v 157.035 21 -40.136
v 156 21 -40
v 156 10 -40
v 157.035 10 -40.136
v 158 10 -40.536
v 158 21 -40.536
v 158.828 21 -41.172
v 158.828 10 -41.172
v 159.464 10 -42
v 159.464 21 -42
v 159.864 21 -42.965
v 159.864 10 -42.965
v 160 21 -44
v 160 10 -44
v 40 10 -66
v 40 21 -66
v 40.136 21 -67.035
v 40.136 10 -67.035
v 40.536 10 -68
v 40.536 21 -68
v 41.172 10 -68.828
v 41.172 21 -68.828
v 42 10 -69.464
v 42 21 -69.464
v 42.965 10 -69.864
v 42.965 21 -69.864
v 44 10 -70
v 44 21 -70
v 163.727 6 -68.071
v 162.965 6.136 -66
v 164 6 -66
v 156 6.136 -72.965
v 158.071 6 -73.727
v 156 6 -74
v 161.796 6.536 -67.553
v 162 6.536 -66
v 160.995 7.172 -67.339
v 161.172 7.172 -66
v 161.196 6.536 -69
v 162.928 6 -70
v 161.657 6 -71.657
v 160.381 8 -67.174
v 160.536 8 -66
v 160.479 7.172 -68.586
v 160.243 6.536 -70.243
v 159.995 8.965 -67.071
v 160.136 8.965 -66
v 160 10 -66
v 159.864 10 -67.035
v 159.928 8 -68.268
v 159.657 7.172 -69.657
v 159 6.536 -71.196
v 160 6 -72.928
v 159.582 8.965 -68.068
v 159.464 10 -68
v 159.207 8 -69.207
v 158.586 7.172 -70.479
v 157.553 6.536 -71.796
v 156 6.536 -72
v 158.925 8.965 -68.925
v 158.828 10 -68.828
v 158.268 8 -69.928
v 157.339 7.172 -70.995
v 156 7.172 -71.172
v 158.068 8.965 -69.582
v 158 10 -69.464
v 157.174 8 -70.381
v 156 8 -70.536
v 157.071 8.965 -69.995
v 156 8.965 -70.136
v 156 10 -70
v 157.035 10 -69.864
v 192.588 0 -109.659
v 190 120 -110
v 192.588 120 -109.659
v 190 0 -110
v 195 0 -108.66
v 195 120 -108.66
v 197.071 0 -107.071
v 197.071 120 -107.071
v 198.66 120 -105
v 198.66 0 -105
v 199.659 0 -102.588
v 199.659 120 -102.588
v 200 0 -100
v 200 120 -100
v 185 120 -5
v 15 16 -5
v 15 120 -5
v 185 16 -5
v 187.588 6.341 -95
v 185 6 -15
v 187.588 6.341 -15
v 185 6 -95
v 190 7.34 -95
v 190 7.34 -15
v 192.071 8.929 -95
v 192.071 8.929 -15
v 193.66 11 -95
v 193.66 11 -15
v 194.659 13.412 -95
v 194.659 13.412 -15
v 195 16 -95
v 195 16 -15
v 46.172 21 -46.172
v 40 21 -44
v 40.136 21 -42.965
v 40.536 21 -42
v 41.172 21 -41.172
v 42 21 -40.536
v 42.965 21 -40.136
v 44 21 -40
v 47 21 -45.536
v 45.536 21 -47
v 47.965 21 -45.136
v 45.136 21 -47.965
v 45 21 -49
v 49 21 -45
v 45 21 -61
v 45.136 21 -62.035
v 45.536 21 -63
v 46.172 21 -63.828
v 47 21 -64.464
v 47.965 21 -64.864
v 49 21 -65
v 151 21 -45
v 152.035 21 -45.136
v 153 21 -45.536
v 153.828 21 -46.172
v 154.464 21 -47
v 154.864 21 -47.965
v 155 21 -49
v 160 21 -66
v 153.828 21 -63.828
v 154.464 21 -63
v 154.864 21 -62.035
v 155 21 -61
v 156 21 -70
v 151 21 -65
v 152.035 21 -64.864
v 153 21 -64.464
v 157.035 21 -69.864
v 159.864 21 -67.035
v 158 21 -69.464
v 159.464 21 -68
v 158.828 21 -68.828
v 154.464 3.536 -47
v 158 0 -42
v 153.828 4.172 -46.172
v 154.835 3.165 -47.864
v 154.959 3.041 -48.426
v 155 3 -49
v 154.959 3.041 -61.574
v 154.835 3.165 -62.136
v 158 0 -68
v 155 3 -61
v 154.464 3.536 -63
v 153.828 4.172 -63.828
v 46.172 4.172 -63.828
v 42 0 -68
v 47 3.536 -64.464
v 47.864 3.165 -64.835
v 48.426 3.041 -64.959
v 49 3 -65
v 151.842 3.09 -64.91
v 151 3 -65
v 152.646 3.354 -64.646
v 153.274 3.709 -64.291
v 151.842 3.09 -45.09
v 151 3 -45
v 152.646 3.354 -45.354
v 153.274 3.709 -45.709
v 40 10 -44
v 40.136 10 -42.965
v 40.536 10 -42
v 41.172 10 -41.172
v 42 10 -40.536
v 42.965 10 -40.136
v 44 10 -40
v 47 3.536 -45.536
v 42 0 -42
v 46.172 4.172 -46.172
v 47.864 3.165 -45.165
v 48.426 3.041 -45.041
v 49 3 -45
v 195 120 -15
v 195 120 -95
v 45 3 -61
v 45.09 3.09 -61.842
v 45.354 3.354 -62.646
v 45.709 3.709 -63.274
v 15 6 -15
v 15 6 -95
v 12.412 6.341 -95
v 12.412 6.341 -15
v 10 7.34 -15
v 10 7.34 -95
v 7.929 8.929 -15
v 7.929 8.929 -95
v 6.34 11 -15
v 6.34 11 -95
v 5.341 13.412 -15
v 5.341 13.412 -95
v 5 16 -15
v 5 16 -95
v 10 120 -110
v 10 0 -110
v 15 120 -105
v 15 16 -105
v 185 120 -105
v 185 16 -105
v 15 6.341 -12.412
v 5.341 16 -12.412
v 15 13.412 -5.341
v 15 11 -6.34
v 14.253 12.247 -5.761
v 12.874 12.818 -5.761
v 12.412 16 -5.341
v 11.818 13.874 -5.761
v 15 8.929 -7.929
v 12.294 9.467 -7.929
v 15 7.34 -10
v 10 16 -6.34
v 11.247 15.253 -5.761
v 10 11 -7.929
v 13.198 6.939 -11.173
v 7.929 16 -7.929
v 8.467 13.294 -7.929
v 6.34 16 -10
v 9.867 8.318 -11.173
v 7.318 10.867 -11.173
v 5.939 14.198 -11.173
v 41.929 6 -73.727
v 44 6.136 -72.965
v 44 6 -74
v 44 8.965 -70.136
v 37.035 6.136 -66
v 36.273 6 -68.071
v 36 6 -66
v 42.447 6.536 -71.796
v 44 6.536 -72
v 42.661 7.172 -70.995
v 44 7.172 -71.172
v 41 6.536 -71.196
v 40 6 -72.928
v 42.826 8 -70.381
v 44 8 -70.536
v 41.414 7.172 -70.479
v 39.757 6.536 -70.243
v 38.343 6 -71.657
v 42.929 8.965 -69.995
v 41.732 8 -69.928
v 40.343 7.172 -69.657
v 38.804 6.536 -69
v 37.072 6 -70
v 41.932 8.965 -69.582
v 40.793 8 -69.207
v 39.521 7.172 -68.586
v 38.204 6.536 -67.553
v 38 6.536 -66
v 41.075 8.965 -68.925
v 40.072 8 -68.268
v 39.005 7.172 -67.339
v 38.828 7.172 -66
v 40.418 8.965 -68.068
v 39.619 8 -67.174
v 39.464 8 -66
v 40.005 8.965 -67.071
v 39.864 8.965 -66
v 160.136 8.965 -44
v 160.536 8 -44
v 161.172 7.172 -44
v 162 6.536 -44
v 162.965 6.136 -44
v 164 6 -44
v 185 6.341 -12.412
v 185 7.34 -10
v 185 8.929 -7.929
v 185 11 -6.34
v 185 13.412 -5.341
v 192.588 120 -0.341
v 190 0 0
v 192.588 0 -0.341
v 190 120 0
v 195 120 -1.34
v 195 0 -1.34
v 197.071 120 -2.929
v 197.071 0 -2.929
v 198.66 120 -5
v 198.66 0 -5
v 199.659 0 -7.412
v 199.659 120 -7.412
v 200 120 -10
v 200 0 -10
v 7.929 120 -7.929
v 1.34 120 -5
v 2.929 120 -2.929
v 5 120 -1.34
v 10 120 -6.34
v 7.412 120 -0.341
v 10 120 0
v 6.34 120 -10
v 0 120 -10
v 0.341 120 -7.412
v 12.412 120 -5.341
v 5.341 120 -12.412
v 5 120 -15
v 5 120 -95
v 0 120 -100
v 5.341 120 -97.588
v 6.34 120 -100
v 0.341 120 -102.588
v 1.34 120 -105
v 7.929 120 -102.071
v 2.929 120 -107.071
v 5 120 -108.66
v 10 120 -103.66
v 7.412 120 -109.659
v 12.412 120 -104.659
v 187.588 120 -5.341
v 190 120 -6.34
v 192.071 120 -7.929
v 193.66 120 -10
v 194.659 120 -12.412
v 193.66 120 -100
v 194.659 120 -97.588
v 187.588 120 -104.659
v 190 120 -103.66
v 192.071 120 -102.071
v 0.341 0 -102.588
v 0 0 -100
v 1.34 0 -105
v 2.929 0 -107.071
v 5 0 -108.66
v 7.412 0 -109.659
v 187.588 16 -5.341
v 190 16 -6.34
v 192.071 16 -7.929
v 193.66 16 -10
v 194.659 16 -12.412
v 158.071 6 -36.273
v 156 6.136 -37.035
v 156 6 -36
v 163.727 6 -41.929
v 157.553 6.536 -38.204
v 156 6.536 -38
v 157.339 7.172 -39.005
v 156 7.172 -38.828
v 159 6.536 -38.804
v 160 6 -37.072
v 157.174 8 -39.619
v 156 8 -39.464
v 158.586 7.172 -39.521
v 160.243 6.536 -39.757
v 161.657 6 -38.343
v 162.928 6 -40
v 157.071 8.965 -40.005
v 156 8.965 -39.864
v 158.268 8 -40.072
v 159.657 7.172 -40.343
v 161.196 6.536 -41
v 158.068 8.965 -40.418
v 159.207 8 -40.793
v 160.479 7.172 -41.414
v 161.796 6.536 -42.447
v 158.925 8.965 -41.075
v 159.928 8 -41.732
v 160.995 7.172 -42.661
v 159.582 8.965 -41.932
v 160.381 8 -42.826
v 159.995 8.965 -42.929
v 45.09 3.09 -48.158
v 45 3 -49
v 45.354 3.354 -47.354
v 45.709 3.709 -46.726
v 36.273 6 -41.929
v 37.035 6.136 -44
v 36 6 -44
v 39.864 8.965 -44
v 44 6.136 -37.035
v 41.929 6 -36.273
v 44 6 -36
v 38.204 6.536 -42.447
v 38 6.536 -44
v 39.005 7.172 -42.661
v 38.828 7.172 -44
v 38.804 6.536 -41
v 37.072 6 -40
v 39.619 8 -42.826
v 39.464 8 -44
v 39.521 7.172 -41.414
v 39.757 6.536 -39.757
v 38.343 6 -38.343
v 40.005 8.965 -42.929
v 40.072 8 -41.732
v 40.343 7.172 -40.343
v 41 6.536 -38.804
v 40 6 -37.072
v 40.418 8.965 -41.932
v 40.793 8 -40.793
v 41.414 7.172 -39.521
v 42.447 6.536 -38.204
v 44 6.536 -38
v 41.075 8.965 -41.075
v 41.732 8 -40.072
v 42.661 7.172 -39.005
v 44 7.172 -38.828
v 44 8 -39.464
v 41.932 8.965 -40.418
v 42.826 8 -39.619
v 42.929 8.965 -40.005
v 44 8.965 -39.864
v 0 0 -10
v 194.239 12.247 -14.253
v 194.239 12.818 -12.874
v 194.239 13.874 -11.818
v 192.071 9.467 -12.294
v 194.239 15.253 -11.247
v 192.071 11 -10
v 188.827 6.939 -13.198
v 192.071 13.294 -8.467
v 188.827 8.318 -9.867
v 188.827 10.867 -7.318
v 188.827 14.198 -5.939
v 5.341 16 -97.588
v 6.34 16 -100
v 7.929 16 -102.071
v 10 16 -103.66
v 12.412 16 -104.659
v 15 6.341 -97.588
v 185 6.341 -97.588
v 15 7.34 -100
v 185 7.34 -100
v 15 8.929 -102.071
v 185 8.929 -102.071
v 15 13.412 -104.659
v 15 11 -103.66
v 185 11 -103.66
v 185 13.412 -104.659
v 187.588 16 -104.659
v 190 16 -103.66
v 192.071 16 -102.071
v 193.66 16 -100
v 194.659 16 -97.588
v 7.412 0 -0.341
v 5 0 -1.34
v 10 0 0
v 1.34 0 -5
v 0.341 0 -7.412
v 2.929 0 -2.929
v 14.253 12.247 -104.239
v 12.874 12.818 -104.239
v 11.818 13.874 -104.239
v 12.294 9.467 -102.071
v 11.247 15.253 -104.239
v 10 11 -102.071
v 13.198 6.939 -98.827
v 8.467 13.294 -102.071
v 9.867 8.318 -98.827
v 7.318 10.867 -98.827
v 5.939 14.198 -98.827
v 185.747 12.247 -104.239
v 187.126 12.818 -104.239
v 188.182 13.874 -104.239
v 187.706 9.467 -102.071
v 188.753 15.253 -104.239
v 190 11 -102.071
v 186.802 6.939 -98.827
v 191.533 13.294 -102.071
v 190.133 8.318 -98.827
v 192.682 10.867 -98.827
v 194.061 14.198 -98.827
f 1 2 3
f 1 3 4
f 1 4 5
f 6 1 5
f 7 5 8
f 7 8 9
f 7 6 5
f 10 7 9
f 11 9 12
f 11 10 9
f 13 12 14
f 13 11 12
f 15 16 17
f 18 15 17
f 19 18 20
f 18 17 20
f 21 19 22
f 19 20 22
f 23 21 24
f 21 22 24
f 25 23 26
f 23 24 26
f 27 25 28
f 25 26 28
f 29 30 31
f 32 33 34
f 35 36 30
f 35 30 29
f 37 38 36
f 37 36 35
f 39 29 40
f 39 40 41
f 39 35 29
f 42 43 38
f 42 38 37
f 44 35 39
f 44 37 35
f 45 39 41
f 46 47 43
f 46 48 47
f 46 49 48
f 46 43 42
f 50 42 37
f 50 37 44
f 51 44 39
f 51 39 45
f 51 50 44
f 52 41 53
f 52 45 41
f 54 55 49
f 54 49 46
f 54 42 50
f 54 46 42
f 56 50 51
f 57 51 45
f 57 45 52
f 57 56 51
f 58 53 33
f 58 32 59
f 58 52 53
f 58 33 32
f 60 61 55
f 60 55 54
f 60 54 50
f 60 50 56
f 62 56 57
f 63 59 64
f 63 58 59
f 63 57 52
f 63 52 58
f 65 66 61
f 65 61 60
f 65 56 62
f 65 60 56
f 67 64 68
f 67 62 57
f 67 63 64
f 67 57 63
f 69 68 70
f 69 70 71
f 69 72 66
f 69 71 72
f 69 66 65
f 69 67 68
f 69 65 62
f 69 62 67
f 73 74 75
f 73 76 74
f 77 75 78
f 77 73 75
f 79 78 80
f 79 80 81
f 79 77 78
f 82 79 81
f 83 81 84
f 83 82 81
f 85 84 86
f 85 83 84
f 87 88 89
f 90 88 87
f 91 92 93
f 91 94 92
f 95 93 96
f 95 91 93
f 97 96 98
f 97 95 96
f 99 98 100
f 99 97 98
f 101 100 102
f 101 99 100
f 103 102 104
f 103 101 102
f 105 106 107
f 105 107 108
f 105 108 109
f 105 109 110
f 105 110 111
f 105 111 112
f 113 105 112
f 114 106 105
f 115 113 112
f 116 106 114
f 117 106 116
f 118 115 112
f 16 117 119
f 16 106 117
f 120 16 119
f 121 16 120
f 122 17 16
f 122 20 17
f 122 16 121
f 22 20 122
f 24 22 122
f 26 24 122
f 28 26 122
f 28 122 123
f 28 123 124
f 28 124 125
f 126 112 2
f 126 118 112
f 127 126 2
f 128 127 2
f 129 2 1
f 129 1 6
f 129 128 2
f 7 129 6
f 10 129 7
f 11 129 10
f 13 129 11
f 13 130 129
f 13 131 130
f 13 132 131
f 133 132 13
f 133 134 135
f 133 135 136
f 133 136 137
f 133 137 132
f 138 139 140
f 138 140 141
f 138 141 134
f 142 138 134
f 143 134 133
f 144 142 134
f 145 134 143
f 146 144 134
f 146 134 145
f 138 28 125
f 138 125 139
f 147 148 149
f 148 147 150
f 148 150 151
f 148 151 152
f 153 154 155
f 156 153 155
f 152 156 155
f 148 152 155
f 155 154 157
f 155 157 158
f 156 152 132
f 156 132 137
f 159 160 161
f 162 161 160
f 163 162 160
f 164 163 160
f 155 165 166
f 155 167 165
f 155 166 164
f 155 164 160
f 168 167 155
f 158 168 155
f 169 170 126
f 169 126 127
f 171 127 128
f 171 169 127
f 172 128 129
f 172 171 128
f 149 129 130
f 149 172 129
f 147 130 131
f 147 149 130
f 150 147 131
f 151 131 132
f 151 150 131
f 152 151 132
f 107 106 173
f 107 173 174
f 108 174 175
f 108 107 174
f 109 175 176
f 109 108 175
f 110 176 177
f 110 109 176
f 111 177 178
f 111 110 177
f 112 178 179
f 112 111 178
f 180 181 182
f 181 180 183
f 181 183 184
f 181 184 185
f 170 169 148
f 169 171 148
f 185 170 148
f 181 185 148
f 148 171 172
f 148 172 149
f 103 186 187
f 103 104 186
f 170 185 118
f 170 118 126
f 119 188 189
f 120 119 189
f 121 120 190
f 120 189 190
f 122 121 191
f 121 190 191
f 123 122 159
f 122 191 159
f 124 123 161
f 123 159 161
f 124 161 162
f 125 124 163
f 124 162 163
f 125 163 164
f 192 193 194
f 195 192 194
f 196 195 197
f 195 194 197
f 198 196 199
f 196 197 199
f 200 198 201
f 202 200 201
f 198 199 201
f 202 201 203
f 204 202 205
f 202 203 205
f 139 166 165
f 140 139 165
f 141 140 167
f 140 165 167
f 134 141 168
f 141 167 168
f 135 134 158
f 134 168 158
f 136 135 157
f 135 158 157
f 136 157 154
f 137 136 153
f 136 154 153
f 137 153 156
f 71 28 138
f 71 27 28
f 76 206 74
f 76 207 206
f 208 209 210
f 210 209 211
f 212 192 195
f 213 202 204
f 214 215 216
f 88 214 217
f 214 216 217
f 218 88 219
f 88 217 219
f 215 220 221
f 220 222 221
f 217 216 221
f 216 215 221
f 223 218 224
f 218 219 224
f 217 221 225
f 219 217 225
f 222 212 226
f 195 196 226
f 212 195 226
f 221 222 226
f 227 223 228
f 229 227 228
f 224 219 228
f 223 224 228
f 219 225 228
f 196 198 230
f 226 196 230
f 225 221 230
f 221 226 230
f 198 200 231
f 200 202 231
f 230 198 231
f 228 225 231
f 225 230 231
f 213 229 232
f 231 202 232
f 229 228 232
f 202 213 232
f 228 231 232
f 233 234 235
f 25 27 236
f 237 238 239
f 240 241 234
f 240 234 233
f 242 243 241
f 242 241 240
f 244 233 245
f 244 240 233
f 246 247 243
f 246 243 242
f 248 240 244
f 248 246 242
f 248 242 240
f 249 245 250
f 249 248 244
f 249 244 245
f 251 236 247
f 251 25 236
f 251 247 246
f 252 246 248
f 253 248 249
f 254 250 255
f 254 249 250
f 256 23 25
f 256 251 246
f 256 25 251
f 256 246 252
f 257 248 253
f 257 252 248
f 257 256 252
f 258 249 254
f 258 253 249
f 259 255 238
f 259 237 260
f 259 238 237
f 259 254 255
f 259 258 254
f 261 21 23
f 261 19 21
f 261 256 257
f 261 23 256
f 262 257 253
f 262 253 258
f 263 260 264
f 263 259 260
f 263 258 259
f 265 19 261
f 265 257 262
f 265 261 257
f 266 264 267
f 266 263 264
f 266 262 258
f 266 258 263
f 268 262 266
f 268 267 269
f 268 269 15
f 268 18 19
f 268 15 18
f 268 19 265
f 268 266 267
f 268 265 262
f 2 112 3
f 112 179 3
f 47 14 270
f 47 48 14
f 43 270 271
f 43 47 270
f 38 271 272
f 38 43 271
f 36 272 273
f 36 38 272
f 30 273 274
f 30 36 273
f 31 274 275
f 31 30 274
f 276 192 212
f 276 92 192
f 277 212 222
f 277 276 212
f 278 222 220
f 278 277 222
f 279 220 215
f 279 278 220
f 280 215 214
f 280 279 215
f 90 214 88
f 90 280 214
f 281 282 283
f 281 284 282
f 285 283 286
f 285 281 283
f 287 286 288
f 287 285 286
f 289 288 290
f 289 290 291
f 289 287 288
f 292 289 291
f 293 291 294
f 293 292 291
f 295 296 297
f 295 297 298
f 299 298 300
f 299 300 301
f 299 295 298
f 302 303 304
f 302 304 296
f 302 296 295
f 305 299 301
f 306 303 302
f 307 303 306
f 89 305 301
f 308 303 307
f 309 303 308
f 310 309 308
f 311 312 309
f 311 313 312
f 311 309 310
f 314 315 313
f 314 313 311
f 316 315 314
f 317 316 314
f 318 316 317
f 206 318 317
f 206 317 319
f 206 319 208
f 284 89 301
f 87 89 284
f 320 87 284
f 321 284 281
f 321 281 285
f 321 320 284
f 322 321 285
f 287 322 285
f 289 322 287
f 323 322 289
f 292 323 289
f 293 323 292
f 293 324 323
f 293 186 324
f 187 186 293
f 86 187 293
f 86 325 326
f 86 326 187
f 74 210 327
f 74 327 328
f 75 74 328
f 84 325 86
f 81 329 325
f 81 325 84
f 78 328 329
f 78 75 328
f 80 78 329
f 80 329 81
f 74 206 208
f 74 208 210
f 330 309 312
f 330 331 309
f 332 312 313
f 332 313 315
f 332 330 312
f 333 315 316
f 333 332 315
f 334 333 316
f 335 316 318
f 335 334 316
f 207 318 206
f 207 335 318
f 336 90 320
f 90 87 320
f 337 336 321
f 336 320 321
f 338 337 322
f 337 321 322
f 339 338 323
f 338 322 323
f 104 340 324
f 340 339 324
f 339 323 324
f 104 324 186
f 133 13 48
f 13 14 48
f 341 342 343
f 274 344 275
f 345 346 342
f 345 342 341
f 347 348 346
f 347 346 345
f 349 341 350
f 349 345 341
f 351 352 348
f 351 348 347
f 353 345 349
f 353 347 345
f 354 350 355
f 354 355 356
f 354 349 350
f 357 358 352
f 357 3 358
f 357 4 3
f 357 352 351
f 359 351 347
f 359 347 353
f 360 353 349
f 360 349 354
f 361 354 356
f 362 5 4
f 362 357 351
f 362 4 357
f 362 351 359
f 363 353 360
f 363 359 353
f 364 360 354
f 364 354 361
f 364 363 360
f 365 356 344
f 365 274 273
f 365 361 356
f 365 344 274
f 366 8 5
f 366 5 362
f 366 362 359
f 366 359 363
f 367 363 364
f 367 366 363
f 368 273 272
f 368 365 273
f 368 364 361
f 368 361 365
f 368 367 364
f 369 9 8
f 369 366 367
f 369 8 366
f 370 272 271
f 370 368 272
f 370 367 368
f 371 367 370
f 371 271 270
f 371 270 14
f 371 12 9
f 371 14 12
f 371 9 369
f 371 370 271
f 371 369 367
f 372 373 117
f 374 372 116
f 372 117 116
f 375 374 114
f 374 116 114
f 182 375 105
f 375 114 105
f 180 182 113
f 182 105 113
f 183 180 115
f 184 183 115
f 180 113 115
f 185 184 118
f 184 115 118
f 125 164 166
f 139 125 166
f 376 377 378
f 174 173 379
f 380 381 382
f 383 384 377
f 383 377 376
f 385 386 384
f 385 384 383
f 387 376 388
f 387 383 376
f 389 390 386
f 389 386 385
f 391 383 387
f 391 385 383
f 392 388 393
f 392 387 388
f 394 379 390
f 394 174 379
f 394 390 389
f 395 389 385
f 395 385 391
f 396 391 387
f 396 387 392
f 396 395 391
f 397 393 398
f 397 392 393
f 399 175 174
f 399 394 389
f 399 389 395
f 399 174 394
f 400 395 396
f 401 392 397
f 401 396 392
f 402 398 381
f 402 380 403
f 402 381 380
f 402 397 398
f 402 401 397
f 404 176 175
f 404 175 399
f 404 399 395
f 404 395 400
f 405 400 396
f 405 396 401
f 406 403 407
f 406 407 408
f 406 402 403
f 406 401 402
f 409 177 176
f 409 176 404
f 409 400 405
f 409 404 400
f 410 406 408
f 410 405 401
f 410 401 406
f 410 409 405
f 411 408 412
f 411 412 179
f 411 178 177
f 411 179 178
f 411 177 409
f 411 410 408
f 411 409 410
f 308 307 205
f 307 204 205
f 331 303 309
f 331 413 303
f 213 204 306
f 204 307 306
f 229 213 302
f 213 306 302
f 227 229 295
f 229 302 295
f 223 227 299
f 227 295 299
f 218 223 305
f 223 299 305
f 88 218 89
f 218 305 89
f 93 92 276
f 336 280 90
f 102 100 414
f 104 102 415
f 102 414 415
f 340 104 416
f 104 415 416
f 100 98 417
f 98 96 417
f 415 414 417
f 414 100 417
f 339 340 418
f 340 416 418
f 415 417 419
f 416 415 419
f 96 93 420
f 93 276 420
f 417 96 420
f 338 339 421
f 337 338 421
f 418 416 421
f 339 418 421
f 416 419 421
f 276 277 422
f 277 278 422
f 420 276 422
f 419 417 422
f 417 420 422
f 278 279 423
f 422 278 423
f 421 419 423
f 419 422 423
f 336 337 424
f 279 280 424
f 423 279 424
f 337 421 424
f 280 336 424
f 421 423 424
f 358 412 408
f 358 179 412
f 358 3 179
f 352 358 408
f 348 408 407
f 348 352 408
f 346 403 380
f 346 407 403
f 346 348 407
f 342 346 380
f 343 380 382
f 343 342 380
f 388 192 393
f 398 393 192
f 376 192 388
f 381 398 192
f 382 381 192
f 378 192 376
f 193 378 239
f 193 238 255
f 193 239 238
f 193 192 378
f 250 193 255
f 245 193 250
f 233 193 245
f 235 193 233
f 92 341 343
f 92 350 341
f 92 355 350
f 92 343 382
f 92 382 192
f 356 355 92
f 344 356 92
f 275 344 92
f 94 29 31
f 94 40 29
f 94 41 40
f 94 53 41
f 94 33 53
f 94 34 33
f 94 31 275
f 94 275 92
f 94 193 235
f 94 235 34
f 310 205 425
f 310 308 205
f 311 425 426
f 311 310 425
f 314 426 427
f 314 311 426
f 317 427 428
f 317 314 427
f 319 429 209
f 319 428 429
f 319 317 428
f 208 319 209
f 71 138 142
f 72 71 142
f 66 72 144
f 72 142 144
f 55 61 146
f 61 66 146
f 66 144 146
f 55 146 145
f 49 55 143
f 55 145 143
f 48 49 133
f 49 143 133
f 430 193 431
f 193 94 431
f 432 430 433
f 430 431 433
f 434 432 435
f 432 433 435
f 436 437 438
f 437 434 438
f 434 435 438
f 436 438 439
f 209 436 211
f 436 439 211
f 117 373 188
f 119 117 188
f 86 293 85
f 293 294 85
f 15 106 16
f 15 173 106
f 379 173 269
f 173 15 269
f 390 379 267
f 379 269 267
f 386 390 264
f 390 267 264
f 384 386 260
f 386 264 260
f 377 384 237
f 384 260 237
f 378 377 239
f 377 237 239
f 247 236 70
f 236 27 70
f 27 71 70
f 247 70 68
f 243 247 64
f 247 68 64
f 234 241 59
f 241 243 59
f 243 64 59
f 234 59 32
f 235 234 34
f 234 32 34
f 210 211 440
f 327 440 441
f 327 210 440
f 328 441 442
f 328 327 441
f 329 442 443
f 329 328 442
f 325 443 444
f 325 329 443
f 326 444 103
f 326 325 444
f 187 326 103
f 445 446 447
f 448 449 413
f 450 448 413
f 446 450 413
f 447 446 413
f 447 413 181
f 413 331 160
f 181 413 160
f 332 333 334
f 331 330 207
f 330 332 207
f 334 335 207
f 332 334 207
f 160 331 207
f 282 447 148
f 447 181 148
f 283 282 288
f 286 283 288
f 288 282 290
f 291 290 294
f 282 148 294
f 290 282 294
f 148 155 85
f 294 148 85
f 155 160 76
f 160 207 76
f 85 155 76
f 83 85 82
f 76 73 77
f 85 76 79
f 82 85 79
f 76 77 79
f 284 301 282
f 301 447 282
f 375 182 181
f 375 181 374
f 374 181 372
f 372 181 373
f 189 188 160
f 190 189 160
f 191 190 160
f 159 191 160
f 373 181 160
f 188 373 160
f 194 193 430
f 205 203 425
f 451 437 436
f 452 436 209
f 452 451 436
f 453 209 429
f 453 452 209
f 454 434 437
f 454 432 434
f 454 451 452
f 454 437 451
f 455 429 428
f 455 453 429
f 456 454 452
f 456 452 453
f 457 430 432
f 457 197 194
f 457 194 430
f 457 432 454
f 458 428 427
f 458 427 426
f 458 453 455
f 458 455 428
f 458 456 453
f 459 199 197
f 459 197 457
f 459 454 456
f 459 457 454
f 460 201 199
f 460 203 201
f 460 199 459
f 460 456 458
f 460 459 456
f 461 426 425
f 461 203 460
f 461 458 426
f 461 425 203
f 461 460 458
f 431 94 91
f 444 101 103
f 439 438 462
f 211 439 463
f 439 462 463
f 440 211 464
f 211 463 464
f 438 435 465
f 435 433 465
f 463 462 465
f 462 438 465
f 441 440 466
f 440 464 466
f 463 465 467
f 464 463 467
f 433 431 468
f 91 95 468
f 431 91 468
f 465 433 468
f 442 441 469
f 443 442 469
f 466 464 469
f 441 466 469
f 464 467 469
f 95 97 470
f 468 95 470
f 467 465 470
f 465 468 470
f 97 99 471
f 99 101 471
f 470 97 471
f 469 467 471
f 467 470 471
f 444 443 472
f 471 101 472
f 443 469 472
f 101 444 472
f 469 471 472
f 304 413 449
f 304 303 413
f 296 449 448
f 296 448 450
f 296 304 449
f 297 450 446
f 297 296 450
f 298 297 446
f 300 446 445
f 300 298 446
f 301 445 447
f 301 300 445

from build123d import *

# Parameters (mm, degrees)
SKETCH1_W           = 200
SKETCH1_H           = 110
BOSS_EXTRUDE1_DEPTH = 6
SKETCH2_W           = 200
SKETCH2_H           = 110
SKETCH2_W_2         = 190
SKETCH2_H_2         = 100
BOSS_EXTRUDE2_DEPTH = 114
SKETCH3_W           = 110
SKETCH3_H           = 20
CUT_EXTRUDE1_DEPTH  = 256.139177705
SKETCH4_W           = 120
SKETCH4_H           = 30
SKETCH4_W_2         = 110
SKETCH4_H_2         = 20
BOSS_EXTRUDE3_DEPTH = 15
CHAMFER2_SIZE       = 3
FILLET1_R           = 10
FILLET2_R           = 4


with BuildPart() as part:
    # Sketch1 → Boss-Extrude1 (new body)
    with BuildSketch(Plane(origin=(0, 0, 0), x_dir=(1, 0, 0), z_dir=(0, 1, 0))):
        with Locations((100, 55)):
            Rectangle(SKETCH1_W, SKETCH1_H)
    extrude(amount=BOSS_EXTRUDE1_DEPTH)

    # Sketch2 → Boss-Extrude2 (add)
    with BuildSketch(Plane(origin=(0, 6, 0), x_dir=(1, 0, 0), z_dir=(0, 1, 0))):
        with Locations((100, 55)):
            Rectangle(SKETCH2_W, SKETCH2_H)
        with Locations((100, 55)):
            Rectangle(SKETCH2_W_2, SKETCH2_H_2, mode=Mode.SUBTRACT)
    extrude(amount=BOSS_EXTRUDE2_DEPTH)

    # Sketch3 → Cut-Extrude1 (cut, through all)
    with BuildSketch(Plane(origin=(0, 6, 0), x_dir=(1, 0, 0), z_dir=(0, 1, 0))):
        with Locations((100, 55)):
            Rectangle(SKETCH3_W, SKETCH3_H)
    extrude(amount=-CUT_EXTRUDE1_DEPTH, mode=Mode.SUBTRACT)

    # Sketch4 → Boss-Extrude3 (add)
    with BuildSketch(Plane(origin=(0, 6, 0), x_dir=(1, 0, 0), z_dir=(0, 1, 0))):
        with Locations((100, 55)):
            Rectangle(SKETCH4_W, SKETCH4_H)
        with Locations((100, 55)):
            Rectangle(SKETCH4_W_2, SKETCH4_H_2, mode=Mode.SUBTRACT)
    extrude(amount=BOSS_EXTRUDE3_DEPTH)

    # Chamfer2
    chamfer2_edges = [part.edges().sort_by_distance(p)[0] for p in [
        (45, 0, -55),
        (100, 0, -65),
        (155, 0, -55),
        (100, 0, -45),
    ]]
    chamfer(chamfer2_edges, length=CHAMFER2_SIZE)

    # Fillet1
    fillet1_edges = [part.edges().sort_by_distance(p)[0] for p in [
        (5, 6, -55),
        (100, 6, -5),
        (195, 6, -55),
        (100, 6, -105),
        (195, 63, -5),
        (195, 63, -105),
        (5, 63, -105),
        (5, 63, -5),
        (0, 60, -110),
        (200, 60, -110),
        (200, 60, 0),
        (0, 60, 0),
    ]]
    fillet(fillet1_edges, radius=FILLET1_R)

    # Fillet2
    fillet2_edges = [part.edges().sort_by_distance(p)[0] for p in [
        (100, 6, -70),
        (160, 13.5, -70),
        (40, 6, -55),
        (40, 13.5, -70),
        (100, 6, -40),
        (40, 13.5, -40),
        (160, 6, -55),
        (160, 13.5, -40),
        (155, 12, -45),
        (155, 12, -65),
        (45, 12, -65),
        (45, 12, -45),
    ]]
    fillet(fillet2_edges, radius=FILLET2_R)


solid = part.part
